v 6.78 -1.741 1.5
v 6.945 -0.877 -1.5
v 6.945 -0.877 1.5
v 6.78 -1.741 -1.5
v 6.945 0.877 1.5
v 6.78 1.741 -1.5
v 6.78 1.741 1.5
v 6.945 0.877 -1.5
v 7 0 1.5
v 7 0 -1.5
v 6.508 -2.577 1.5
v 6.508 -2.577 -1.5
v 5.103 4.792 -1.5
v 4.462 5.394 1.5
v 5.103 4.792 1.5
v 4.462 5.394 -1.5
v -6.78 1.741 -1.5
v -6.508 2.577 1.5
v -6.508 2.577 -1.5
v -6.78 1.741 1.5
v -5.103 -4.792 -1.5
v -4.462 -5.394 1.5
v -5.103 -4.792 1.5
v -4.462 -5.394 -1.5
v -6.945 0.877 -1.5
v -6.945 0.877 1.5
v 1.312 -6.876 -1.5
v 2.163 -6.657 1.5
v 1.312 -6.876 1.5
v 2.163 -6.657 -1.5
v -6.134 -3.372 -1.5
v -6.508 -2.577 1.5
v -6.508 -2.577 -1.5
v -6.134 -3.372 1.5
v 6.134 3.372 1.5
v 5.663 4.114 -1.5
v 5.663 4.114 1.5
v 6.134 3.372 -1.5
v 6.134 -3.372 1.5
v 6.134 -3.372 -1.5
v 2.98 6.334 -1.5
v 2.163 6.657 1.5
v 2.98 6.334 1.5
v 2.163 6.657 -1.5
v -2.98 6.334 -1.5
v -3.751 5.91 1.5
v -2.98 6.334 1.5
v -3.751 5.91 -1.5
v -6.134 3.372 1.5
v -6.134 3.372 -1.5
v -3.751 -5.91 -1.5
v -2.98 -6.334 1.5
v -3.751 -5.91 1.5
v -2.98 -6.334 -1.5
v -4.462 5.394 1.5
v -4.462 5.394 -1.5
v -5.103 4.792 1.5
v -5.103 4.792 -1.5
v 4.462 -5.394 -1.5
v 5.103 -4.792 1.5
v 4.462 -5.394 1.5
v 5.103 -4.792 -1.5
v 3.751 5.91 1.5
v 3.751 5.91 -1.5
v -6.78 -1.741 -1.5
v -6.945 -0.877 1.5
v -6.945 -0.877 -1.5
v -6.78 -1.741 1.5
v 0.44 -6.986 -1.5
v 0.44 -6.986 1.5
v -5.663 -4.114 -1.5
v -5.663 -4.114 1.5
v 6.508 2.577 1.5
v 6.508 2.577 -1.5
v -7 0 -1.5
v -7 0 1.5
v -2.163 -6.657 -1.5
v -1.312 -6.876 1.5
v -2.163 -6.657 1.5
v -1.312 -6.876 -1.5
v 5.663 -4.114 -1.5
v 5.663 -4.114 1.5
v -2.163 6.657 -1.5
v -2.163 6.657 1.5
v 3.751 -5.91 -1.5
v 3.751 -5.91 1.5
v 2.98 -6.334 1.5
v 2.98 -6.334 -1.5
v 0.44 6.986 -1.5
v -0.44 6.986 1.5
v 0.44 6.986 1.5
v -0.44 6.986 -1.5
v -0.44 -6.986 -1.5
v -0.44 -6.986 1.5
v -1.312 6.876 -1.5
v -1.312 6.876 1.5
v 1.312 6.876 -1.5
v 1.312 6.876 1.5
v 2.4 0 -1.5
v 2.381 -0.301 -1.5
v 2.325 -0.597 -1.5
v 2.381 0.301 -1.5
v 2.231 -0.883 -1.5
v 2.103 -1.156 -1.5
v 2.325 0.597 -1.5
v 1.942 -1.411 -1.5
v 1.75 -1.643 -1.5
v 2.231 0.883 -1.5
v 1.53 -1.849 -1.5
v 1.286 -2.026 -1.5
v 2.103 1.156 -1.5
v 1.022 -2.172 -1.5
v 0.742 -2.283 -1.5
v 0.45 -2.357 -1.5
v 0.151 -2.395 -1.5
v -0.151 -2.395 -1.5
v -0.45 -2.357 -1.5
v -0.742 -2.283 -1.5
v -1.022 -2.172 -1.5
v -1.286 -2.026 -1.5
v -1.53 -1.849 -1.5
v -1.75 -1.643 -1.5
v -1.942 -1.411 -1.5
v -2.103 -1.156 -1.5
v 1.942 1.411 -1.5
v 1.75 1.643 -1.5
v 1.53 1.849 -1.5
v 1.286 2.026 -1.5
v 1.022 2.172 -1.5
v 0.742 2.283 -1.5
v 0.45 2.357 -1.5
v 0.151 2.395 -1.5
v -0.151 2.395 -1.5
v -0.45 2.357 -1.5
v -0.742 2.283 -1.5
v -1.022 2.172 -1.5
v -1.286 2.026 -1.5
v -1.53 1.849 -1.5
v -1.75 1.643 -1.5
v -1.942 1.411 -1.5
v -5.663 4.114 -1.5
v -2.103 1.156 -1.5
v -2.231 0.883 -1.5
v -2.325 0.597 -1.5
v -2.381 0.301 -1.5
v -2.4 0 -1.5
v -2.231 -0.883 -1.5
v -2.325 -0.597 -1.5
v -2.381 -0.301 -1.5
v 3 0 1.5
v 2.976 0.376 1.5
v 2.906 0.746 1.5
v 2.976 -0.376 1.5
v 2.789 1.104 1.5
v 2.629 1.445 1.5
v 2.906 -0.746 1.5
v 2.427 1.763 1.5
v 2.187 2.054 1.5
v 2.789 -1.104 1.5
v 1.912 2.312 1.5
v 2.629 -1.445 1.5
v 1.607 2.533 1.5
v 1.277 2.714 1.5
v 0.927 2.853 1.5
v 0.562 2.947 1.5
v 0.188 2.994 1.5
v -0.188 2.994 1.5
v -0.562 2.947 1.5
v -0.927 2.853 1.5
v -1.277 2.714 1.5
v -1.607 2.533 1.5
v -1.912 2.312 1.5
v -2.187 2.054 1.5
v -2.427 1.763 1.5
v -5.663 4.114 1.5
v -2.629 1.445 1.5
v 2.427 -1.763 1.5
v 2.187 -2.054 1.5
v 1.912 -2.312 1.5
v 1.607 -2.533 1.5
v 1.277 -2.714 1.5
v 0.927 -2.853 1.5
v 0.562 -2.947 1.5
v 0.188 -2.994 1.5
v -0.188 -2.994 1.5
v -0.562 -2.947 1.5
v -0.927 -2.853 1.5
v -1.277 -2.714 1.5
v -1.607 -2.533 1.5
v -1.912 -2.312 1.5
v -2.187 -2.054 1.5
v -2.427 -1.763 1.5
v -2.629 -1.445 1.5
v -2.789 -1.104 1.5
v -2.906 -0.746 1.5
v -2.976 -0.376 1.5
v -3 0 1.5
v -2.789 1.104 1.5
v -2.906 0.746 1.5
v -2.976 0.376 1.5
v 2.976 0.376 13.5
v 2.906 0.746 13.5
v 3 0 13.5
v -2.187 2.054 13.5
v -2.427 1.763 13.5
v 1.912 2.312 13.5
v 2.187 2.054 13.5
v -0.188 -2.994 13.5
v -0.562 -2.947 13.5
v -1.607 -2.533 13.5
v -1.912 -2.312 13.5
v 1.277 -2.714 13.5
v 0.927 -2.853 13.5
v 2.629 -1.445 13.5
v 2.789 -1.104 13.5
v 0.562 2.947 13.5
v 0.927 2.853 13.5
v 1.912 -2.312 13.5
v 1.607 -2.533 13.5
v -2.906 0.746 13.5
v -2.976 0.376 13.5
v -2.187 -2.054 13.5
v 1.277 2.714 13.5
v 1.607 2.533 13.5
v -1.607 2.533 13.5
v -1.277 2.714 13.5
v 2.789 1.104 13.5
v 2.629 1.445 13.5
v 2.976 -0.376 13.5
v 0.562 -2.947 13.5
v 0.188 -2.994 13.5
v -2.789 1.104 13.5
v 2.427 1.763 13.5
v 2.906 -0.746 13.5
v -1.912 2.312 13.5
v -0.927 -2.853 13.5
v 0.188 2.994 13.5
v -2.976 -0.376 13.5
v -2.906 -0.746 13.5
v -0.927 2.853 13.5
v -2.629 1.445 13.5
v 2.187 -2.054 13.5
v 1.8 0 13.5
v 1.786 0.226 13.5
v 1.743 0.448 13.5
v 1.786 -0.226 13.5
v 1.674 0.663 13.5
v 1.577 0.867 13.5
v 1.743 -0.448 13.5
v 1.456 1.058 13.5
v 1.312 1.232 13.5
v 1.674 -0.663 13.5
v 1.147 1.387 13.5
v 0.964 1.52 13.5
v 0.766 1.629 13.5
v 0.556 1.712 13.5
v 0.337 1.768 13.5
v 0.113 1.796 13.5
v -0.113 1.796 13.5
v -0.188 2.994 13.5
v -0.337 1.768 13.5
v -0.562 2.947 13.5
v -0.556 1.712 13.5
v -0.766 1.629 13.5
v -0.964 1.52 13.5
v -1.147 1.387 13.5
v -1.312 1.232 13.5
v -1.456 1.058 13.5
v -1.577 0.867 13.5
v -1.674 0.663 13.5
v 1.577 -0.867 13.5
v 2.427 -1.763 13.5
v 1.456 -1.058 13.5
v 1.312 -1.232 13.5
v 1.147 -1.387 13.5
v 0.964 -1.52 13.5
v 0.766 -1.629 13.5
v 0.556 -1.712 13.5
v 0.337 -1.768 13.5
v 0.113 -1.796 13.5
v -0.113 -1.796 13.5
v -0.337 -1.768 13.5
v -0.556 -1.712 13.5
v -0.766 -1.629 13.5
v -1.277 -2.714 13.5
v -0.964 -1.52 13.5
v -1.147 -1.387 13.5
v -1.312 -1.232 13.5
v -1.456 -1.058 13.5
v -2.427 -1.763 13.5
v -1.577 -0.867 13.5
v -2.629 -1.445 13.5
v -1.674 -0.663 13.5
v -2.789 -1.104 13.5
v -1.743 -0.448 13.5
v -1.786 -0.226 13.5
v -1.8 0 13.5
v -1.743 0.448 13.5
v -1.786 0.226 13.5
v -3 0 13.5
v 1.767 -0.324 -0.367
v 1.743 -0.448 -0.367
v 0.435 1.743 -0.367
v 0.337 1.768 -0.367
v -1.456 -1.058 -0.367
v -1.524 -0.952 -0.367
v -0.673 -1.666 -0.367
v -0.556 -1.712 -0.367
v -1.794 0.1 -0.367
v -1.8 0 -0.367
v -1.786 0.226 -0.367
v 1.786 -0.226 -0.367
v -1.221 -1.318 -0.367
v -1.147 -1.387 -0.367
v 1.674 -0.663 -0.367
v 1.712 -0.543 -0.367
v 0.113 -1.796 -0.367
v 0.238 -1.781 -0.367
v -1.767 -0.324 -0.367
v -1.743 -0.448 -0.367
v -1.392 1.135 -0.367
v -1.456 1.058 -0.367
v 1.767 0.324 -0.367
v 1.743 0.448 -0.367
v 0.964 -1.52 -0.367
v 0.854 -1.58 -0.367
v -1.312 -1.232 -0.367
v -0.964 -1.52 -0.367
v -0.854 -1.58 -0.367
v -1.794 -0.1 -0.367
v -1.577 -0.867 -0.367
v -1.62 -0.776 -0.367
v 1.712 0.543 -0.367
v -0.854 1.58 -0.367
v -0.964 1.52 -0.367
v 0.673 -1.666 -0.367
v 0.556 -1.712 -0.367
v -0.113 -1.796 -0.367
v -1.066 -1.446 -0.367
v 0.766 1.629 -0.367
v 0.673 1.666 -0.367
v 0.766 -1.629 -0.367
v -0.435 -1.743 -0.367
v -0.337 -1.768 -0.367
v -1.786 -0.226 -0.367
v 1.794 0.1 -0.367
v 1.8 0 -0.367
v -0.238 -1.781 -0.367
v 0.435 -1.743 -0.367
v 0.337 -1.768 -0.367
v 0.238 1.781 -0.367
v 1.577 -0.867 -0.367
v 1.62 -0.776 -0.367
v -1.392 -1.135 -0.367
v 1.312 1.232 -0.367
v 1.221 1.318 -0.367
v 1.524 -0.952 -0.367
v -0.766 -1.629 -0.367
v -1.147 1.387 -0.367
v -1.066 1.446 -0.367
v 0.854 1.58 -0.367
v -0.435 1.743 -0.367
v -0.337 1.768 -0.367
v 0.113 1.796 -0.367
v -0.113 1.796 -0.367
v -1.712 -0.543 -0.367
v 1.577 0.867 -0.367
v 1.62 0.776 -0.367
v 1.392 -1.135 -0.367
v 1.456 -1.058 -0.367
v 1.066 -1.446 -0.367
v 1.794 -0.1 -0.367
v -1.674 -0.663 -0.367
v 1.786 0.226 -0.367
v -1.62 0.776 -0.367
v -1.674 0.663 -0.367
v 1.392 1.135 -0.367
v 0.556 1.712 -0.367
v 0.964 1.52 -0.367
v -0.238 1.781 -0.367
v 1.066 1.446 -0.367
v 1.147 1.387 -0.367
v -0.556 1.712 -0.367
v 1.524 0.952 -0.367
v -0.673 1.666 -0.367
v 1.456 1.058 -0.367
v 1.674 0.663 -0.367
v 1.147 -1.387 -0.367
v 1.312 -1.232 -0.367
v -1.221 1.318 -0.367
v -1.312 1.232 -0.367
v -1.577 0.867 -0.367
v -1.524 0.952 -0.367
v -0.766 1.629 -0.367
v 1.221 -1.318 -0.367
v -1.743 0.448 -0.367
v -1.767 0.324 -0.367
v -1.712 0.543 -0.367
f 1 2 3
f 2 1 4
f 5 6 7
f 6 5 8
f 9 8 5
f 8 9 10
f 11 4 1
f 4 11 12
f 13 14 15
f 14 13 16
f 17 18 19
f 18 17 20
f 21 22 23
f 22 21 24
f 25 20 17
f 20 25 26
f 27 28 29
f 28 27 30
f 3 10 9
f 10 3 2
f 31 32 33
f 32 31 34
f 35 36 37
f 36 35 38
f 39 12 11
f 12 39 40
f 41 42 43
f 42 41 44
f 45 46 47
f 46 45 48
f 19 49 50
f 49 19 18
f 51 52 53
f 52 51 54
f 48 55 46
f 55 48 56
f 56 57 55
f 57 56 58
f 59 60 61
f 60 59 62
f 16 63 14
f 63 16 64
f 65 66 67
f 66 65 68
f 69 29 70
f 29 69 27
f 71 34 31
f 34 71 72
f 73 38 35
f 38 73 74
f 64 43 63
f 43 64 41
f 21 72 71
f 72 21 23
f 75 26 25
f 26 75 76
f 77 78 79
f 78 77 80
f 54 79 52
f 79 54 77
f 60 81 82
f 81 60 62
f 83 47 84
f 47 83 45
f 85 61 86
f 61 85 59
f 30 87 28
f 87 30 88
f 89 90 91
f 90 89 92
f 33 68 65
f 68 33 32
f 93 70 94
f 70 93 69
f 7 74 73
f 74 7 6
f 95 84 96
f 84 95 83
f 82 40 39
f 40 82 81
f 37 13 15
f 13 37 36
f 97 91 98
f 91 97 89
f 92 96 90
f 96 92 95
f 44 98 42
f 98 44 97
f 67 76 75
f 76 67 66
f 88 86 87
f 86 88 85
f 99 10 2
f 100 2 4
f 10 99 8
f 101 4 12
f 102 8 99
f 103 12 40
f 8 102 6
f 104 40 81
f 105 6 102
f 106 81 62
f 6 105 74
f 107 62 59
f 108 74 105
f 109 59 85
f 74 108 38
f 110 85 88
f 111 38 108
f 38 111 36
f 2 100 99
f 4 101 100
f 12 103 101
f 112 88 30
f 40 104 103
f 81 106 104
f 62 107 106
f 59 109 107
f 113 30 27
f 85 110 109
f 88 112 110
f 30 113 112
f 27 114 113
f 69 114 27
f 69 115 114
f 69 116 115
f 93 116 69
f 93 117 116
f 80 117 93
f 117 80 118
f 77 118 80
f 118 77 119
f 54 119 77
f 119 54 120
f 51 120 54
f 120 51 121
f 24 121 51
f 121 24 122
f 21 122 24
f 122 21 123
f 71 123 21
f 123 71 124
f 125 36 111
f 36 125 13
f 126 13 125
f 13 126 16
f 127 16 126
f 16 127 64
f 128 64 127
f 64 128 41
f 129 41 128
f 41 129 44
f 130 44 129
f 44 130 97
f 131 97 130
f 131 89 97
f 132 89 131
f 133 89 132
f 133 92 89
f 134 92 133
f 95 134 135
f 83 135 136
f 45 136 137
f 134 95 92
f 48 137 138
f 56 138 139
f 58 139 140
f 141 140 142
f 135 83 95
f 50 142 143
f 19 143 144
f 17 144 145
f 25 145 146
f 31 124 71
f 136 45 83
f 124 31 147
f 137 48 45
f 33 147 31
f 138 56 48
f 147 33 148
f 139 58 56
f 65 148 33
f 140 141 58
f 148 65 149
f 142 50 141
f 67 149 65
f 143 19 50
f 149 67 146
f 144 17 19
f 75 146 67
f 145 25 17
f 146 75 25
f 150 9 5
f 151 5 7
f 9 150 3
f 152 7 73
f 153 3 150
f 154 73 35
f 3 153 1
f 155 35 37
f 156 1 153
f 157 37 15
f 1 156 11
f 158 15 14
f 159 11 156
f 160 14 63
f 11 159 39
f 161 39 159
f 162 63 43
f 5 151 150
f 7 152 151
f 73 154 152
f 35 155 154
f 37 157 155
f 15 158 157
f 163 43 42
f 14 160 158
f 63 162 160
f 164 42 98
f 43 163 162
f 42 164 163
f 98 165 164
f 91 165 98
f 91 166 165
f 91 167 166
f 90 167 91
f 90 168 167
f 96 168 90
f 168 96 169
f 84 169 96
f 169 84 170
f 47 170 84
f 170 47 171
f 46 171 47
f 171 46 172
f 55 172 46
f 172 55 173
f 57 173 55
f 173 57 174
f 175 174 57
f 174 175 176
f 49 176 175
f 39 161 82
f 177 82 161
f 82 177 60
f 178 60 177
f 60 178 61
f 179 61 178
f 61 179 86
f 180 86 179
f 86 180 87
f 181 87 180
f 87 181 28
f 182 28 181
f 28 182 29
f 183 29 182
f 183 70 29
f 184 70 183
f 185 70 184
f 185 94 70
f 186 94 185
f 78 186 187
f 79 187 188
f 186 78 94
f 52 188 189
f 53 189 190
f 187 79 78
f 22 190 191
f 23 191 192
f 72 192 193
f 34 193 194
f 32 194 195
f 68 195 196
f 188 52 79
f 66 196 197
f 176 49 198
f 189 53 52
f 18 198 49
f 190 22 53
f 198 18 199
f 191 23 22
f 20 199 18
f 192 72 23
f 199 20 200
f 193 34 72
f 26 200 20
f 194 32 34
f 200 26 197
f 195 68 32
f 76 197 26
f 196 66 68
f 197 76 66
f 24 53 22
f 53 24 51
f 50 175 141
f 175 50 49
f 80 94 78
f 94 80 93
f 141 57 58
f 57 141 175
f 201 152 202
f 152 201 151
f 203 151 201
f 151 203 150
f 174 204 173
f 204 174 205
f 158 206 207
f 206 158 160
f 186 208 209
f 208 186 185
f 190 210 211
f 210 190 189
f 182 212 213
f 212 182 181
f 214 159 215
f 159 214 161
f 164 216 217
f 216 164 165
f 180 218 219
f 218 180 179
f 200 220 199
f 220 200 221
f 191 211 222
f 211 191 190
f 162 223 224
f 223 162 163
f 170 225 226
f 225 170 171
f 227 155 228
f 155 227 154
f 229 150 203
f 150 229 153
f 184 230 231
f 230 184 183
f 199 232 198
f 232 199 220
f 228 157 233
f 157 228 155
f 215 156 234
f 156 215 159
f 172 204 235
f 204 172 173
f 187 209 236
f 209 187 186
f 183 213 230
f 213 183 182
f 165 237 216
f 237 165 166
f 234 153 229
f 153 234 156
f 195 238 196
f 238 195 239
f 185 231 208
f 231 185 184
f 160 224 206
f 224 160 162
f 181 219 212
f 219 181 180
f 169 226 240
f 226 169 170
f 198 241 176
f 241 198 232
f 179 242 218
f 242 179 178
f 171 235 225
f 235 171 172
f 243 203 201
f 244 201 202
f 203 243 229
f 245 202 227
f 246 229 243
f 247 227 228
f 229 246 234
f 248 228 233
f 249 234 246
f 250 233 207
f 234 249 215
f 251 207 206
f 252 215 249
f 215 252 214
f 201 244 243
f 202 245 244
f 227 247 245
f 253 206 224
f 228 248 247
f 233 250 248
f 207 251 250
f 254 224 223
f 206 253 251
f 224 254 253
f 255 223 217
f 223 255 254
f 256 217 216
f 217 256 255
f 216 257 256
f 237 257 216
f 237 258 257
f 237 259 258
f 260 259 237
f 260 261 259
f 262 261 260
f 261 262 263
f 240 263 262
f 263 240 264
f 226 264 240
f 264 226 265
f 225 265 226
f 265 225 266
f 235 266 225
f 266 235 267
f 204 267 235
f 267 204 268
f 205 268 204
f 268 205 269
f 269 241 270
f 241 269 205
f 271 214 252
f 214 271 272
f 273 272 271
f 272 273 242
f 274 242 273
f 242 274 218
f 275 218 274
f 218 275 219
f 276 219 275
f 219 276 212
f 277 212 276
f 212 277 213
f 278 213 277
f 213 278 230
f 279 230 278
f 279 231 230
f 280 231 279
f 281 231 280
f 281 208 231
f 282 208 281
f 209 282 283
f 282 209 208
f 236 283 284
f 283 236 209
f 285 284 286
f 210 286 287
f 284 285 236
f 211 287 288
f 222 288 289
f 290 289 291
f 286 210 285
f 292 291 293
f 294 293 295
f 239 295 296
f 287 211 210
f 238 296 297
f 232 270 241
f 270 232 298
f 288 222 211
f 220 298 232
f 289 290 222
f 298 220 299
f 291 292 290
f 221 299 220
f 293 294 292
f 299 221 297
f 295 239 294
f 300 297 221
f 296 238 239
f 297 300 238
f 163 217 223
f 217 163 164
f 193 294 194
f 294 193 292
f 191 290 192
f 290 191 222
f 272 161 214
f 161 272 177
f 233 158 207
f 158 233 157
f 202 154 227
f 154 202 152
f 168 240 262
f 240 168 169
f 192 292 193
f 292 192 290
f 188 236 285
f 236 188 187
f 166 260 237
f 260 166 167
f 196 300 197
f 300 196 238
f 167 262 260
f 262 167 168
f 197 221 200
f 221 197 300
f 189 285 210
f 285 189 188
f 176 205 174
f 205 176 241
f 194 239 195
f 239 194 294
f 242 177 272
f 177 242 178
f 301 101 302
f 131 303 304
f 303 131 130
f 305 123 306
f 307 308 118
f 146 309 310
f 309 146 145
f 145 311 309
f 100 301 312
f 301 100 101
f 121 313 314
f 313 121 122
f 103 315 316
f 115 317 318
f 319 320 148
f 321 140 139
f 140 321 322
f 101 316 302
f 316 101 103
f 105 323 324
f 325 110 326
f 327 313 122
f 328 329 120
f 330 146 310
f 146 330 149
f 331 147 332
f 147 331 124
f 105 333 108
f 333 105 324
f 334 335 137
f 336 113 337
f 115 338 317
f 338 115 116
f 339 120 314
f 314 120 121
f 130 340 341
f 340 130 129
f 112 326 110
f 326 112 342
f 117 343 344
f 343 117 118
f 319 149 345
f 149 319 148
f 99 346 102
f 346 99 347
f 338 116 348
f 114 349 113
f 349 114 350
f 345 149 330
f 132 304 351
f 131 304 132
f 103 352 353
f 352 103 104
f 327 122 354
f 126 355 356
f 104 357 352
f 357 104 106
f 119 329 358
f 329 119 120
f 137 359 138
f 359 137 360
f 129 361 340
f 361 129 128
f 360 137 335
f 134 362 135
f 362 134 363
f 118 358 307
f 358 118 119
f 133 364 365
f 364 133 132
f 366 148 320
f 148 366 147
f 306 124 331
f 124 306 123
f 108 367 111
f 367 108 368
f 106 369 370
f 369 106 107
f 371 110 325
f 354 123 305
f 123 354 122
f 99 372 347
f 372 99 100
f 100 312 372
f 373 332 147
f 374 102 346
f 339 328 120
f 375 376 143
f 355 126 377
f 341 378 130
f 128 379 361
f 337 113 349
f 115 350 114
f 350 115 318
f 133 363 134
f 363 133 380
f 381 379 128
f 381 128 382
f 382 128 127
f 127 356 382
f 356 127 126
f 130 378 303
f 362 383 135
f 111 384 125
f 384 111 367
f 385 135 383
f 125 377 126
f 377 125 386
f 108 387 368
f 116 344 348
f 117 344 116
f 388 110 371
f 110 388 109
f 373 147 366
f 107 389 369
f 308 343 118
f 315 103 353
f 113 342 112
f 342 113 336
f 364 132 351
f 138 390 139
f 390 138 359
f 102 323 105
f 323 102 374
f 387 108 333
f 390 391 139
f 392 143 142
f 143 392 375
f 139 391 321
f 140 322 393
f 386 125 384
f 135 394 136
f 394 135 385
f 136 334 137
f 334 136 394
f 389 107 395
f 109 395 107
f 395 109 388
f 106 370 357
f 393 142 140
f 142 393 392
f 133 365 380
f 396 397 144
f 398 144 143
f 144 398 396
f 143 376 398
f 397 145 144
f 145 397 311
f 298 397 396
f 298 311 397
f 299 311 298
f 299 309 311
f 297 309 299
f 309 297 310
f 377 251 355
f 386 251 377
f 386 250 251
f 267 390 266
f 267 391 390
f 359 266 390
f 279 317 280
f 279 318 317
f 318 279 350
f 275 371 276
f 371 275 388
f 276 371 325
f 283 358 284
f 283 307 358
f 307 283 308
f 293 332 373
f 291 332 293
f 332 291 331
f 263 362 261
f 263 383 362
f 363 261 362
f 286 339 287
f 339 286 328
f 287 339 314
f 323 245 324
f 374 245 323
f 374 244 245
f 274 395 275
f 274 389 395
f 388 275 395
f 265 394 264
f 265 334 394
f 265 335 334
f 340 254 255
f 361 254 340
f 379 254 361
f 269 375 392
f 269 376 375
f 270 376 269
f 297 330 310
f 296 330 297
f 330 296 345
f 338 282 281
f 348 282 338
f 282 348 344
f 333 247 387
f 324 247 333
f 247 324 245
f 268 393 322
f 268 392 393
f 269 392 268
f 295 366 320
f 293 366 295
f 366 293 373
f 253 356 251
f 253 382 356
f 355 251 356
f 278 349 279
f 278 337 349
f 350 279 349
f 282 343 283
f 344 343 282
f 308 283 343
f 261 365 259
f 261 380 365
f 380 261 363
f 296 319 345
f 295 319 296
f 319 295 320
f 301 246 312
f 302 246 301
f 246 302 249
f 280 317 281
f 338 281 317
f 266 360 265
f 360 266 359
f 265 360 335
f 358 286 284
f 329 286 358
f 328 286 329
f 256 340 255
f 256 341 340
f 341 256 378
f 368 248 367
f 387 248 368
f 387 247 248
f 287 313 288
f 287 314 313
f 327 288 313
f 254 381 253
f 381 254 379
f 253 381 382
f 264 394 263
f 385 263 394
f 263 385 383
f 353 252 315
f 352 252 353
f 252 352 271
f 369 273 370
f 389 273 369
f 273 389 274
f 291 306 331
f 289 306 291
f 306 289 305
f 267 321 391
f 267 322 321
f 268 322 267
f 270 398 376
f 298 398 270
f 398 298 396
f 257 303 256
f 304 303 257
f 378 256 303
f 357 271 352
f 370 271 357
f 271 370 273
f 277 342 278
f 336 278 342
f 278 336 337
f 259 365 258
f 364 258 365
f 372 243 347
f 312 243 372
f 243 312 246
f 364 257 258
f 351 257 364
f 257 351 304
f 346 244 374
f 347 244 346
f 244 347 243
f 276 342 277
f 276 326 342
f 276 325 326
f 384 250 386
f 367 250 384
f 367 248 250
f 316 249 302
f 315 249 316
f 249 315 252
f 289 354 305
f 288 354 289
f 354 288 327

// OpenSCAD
$fn = 50;


difference() {
	union() {
		translate(v = [0, 0, -1.5000000000]) {
			cylinder(h = 3, r = 7.0000000000);
		}
		translate(v = [0, 0, -1.5000000000]) {
			cylinder(h = 15, r = 3.0000000000);
		}
	}
	union() {
		translate(v = [0, 0, -1.5000000000]) {
			rotate(a = [0, 180, 0]) {
				difference() {
					union() {
						translate(v = [0, 0, -1.7000000000]) {
							cylinder(h = 1.7000000000, r1 = 1.5000000000, r2 = 2.4000000000);
						}
						translate(v = [0, 0, -15.0000000000]) {
							cylinder(h = 15, r = 1.5000000000);
						}
						translate(v = [0, 0, -15.0000000000]) {
							cylinder(h = 15, r = 1.8000000000);
						}
						translate(v = [0, 0, -15.0000000000]) {
							cylinder(h = 15, r = 1.5000000000);
						}
					}
					union();
				}
			}
		}
		translate(v = [0, 0, -100.0000000000]) {
			cylinder(h = 200, r = 1.5000000000);
		}
	}
}
